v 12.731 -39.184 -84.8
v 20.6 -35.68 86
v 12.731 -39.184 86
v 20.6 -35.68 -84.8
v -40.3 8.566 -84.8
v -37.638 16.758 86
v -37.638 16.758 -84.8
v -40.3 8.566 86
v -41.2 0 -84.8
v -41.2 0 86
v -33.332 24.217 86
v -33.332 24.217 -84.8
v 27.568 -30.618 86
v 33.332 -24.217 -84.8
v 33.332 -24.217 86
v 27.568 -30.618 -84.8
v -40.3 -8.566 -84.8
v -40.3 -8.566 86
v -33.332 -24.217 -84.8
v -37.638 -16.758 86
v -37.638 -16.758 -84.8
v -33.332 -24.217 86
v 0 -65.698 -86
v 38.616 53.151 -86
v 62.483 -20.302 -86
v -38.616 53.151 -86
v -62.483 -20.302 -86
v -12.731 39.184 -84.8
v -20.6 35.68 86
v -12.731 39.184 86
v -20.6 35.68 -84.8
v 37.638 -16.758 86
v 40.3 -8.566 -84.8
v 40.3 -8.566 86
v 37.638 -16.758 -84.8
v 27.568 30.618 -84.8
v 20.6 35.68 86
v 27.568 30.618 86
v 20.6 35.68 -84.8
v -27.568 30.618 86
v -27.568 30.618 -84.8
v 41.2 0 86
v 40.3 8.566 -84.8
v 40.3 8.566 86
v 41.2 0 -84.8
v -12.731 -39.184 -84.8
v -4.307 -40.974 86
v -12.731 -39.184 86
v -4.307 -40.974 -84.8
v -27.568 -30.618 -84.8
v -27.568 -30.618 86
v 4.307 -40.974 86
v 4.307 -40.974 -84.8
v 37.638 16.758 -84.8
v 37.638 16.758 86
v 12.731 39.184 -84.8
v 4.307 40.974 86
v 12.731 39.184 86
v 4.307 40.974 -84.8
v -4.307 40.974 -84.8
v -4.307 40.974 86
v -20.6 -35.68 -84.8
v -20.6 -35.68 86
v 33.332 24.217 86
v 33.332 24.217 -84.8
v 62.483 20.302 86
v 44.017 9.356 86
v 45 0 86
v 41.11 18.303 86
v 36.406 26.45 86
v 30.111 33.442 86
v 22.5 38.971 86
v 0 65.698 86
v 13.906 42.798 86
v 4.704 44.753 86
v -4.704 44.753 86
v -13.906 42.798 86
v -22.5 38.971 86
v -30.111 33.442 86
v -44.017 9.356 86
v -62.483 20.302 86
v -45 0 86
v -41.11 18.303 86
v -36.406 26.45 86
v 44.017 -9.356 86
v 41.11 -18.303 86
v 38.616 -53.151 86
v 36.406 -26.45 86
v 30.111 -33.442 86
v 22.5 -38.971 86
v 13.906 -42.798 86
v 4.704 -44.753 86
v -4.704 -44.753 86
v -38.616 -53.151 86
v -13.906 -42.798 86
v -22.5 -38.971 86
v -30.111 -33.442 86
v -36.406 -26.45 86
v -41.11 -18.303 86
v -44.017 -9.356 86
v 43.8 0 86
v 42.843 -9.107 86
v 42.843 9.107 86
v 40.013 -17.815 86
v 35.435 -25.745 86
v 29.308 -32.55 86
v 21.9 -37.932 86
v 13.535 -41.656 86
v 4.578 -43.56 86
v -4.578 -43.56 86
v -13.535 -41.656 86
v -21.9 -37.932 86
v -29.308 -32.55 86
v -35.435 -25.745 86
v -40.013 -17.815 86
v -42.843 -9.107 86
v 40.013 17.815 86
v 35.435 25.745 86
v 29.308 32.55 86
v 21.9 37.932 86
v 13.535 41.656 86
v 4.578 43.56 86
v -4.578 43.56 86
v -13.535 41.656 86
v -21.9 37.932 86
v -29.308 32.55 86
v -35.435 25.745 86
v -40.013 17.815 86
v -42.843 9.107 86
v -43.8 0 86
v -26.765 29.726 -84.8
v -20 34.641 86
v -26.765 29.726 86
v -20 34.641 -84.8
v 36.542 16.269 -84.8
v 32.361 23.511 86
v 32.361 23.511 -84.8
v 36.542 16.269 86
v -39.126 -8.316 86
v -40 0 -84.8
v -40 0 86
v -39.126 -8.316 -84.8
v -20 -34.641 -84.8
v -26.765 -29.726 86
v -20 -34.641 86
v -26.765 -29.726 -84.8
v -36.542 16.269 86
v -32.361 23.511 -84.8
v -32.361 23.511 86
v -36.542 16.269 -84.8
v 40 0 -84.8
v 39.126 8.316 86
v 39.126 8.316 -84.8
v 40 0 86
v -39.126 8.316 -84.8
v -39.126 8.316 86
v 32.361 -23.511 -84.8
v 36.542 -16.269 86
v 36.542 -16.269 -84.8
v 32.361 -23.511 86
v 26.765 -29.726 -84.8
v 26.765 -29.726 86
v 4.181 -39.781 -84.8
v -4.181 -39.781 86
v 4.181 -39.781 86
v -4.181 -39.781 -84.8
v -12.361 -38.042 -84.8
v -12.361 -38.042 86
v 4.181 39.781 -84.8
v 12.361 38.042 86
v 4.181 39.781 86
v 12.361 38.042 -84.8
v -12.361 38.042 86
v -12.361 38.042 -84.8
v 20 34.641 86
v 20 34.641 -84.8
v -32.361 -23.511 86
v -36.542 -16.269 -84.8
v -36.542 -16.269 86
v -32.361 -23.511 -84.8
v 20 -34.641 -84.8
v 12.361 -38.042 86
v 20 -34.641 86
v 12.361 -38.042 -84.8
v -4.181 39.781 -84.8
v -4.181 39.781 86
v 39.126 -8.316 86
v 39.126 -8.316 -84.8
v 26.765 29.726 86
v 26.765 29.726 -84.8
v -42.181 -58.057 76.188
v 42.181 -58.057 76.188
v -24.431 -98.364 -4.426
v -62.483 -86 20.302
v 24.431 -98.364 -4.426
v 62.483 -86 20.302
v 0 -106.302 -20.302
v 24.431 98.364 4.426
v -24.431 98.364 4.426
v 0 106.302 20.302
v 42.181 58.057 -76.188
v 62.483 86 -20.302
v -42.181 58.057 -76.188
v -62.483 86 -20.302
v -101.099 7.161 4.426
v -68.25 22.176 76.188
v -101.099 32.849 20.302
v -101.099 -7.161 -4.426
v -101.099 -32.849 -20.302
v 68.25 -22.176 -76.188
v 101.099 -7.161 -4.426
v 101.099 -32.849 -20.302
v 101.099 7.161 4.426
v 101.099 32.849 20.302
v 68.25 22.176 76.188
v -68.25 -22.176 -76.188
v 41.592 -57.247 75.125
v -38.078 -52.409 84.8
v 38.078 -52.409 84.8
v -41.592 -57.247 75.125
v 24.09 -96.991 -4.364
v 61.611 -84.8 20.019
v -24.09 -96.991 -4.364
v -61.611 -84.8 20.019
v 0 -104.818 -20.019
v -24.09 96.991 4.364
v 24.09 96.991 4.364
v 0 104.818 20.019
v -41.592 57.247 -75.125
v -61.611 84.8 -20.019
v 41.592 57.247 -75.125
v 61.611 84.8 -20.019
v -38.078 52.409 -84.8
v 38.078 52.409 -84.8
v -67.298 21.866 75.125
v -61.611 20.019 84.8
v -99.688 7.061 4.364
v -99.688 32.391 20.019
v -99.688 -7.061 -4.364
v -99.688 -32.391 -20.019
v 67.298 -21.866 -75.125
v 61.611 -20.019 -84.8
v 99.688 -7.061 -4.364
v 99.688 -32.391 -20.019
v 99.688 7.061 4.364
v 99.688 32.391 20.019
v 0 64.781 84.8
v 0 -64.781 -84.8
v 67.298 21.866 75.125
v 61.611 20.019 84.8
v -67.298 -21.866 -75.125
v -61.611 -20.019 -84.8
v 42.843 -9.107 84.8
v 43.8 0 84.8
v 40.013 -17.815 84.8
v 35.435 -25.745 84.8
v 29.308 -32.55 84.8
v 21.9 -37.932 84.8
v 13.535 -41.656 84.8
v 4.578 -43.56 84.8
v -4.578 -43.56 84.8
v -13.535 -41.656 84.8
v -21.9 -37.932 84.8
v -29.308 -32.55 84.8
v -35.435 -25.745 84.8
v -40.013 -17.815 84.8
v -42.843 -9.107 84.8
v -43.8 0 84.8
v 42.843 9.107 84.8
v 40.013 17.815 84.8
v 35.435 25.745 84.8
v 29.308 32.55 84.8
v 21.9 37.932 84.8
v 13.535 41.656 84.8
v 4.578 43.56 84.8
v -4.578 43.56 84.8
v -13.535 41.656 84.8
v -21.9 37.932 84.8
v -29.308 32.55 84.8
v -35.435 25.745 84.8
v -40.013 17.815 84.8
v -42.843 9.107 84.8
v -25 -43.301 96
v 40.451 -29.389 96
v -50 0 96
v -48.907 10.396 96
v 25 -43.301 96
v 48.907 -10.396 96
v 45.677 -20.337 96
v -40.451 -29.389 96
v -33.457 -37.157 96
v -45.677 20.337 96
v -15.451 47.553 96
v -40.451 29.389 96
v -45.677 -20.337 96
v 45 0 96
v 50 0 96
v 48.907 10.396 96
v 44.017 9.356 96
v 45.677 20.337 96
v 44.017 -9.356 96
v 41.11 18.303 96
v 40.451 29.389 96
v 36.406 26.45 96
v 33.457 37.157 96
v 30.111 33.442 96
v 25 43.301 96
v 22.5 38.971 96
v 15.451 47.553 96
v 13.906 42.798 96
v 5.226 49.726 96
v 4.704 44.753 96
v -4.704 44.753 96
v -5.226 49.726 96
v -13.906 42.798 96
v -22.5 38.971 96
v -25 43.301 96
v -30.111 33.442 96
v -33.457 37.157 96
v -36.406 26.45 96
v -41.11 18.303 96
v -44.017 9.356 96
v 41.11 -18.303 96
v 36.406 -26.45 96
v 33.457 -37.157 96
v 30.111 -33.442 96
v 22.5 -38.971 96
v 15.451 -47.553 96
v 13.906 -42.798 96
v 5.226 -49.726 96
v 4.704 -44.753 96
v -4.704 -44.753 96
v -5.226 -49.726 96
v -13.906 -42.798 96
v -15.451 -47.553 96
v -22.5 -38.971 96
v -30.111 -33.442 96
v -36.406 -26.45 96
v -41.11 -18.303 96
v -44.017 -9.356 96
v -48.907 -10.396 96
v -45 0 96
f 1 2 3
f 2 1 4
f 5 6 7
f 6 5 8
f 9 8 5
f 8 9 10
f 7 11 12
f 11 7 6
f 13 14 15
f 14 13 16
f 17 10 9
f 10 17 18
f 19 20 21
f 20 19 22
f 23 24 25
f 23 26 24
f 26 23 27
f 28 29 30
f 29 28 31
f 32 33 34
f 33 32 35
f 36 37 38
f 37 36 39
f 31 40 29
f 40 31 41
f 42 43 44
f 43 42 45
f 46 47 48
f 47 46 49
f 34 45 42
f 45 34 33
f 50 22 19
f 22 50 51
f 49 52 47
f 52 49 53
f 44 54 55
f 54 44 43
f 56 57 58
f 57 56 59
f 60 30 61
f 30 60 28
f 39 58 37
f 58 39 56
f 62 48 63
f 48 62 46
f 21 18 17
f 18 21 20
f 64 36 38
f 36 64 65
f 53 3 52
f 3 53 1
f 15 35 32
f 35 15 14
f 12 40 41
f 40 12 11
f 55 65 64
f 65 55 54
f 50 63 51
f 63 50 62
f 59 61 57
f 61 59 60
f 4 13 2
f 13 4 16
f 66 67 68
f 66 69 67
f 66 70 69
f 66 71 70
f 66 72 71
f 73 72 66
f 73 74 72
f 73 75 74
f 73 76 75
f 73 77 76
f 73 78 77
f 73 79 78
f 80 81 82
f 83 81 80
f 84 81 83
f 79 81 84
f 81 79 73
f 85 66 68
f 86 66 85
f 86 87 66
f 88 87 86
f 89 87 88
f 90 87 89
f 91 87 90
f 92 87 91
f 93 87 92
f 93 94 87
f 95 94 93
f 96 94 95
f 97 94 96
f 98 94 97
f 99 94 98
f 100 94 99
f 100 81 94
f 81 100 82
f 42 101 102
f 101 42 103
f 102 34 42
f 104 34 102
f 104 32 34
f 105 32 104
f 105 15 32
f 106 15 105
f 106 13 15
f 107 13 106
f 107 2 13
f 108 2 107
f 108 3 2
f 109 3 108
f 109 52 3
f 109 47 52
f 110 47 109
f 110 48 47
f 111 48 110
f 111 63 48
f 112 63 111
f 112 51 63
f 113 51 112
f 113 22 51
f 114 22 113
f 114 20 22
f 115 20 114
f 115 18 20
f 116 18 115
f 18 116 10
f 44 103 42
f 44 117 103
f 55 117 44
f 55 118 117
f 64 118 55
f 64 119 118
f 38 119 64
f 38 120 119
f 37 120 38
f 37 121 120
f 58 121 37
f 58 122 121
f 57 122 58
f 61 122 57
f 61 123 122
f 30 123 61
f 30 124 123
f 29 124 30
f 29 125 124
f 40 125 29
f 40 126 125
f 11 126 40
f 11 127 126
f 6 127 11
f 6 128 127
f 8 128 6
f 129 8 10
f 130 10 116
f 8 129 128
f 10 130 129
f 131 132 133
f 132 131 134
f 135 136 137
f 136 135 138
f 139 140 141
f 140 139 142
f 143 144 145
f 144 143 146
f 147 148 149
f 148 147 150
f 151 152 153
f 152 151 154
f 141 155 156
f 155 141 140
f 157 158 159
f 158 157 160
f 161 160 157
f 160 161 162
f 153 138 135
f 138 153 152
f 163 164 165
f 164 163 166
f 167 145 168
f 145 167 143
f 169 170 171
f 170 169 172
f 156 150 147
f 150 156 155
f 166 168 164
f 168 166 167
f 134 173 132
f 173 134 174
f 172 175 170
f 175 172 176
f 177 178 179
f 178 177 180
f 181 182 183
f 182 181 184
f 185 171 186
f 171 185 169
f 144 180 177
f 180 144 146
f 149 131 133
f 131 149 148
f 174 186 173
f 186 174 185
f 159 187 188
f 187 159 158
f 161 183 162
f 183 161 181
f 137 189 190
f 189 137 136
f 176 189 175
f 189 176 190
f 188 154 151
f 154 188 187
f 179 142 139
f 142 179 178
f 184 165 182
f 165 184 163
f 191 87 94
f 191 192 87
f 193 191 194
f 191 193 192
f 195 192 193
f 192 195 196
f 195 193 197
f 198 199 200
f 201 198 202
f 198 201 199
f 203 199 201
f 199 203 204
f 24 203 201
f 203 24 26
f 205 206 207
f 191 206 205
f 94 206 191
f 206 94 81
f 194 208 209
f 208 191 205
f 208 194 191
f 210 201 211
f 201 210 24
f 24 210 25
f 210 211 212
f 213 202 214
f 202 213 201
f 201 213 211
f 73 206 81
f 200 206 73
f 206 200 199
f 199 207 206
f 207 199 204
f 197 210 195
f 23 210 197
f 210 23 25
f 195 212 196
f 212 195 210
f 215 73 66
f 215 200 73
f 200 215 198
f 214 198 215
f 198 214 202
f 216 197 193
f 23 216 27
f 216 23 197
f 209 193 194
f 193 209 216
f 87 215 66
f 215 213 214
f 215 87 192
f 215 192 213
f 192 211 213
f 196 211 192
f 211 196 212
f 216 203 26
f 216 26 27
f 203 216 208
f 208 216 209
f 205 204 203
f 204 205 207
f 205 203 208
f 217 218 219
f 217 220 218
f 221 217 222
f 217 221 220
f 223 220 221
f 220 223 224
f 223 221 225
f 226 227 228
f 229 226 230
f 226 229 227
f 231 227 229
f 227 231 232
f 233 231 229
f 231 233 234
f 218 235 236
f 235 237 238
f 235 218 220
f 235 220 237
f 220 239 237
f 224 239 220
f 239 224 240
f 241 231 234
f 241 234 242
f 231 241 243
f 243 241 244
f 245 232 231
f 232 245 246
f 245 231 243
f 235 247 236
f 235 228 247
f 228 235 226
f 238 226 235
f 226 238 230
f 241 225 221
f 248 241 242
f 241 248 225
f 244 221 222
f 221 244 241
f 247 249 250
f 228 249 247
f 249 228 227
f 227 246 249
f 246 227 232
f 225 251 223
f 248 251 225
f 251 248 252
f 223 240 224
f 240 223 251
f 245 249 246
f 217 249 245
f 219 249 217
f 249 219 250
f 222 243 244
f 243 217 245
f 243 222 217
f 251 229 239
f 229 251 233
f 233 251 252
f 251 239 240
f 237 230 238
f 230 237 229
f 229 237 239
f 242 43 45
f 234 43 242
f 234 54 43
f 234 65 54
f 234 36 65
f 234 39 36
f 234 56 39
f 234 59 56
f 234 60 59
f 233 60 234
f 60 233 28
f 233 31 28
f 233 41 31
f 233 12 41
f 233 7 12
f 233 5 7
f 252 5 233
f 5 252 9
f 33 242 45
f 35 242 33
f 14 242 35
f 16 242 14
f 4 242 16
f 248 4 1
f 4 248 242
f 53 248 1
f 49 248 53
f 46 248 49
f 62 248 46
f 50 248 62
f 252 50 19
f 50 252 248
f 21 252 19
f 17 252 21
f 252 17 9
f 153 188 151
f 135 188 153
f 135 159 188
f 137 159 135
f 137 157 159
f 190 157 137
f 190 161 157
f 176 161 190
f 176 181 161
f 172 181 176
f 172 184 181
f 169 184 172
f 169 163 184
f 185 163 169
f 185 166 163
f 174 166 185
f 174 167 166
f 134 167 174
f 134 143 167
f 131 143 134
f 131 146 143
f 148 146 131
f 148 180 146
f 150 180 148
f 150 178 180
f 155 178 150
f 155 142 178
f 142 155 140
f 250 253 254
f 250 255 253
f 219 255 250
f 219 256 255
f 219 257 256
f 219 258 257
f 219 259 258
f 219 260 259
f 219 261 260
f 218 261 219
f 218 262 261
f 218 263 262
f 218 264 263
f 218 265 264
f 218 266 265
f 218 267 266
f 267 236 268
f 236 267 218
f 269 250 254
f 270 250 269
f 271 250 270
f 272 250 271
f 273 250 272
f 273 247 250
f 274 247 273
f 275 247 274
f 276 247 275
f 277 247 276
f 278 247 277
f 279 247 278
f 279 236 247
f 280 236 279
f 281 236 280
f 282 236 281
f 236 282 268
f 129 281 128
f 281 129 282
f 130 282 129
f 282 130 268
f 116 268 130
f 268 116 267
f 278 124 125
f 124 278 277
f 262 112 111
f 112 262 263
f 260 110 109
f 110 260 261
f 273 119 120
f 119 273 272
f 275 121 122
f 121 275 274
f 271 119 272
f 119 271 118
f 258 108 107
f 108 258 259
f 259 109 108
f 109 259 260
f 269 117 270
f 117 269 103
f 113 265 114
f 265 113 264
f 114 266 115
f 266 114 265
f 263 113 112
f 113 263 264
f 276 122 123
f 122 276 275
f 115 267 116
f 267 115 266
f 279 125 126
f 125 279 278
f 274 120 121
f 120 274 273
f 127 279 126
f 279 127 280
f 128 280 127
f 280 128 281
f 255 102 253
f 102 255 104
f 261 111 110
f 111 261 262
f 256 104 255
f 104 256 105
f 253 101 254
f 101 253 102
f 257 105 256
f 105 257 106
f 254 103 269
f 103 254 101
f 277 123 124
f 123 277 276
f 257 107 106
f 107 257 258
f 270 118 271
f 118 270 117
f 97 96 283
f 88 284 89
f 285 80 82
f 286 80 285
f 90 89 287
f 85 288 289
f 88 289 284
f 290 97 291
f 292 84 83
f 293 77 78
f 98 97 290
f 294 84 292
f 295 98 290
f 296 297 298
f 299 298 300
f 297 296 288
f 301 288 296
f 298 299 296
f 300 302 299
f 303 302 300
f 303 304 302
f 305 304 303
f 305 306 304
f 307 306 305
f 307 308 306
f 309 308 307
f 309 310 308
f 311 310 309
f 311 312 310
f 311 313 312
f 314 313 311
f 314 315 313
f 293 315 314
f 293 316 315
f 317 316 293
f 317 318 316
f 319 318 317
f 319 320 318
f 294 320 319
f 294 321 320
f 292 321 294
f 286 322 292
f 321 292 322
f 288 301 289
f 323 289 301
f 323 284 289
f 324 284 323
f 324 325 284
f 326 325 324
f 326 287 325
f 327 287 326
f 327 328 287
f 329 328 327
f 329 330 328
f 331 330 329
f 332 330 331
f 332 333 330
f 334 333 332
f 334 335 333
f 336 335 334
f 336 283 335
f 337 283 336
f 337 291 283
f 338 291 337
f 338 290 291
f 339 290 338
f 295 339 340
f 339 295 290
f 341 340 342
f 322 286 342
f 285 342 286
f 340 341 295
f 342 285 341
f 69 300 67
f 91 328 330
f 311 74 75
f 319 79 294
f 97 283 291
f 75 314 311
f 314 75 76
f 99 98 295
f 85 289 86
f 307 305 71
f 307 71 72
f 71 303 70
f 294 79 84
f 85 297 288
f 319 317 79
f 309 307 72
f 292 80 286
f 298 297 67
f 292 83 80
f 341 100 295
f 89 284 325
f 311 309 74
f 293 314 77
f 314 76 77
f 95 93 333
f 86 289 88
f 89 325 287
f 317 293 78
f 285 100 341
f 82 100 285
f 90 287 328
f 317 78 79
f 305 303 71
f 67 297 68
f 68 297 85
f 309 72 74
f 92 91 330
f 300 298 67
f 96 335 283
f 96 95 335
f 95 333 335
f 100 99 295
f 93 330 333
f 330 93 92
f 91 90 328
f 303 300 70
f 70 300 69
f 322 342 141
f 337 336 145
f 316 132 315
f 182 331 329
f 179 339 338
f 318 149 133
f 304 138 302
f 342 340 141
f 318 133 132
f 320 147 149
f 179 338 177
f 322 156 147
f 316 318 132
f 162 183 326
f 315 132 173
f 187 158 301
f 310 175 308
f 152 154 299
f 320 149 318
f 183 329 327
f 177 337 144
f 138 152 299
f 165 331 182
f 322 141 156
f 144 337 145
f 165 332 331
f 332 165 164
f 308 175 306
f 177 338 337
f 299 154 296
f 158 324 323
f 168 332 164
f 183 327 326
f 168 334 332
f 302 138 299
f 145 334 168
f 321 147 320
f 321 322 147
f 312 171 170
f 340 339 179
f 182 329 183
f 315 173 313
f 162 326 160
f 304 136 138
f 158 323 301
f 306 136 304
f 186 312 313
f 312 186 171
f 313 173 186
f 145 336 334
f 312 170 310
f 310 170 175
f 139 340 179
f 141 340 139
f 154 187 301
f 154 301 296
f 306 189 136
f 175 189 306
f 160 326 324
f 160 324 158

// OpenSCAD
radius = 86;
wall_width = 1.2;
lip_radius1 = 45;
lip_radius2 = 50;
lip_height = 10;
lip_width = 5;

module dodecahedron(height) {
    scale([height, height, height]) {
        intersection() {
            cube([2, 2, 1], center = true); 
            intersection_for(i = [0 : 4]) {
                rotate([0, 0, 72*i]) {
                    rotate([116.565, 0, 0]) {
                        cube([2, 2, 1], center = true); 
                    }
                }
            }
        }
    }
}
rotate([0, 180, 0]) {
    translate([0, 0, -radius]) {
        difference() {
            cylinder(radius * 2, lip_radius1 - lip_width + wall_width, lip_radius1 - lip_width + wall_width);
            cylinder(radius * 2, lip_radius1 - lip_width, lip_radius1 - lip_width);
        }
    }
    difference() {
        dodecahedron(radius * 2);
        dodecahedron(radius * 2 - wall_width * 2);
        translate([0, 0, -radius]) {
            cylinder(wall_width * 2, lip_radius1 - wall_width, lip_radius1 - wall_width);
        }
    }
    translate([0, 0, -radius - lip_height]) {
        difference() {
            cylinder(lip_height, lip_radius2, lip_radius1);
            cylinder(lip_height, lip_radius2 - lip_width, lip_radius1 - lip_width);
        }
    }
}
